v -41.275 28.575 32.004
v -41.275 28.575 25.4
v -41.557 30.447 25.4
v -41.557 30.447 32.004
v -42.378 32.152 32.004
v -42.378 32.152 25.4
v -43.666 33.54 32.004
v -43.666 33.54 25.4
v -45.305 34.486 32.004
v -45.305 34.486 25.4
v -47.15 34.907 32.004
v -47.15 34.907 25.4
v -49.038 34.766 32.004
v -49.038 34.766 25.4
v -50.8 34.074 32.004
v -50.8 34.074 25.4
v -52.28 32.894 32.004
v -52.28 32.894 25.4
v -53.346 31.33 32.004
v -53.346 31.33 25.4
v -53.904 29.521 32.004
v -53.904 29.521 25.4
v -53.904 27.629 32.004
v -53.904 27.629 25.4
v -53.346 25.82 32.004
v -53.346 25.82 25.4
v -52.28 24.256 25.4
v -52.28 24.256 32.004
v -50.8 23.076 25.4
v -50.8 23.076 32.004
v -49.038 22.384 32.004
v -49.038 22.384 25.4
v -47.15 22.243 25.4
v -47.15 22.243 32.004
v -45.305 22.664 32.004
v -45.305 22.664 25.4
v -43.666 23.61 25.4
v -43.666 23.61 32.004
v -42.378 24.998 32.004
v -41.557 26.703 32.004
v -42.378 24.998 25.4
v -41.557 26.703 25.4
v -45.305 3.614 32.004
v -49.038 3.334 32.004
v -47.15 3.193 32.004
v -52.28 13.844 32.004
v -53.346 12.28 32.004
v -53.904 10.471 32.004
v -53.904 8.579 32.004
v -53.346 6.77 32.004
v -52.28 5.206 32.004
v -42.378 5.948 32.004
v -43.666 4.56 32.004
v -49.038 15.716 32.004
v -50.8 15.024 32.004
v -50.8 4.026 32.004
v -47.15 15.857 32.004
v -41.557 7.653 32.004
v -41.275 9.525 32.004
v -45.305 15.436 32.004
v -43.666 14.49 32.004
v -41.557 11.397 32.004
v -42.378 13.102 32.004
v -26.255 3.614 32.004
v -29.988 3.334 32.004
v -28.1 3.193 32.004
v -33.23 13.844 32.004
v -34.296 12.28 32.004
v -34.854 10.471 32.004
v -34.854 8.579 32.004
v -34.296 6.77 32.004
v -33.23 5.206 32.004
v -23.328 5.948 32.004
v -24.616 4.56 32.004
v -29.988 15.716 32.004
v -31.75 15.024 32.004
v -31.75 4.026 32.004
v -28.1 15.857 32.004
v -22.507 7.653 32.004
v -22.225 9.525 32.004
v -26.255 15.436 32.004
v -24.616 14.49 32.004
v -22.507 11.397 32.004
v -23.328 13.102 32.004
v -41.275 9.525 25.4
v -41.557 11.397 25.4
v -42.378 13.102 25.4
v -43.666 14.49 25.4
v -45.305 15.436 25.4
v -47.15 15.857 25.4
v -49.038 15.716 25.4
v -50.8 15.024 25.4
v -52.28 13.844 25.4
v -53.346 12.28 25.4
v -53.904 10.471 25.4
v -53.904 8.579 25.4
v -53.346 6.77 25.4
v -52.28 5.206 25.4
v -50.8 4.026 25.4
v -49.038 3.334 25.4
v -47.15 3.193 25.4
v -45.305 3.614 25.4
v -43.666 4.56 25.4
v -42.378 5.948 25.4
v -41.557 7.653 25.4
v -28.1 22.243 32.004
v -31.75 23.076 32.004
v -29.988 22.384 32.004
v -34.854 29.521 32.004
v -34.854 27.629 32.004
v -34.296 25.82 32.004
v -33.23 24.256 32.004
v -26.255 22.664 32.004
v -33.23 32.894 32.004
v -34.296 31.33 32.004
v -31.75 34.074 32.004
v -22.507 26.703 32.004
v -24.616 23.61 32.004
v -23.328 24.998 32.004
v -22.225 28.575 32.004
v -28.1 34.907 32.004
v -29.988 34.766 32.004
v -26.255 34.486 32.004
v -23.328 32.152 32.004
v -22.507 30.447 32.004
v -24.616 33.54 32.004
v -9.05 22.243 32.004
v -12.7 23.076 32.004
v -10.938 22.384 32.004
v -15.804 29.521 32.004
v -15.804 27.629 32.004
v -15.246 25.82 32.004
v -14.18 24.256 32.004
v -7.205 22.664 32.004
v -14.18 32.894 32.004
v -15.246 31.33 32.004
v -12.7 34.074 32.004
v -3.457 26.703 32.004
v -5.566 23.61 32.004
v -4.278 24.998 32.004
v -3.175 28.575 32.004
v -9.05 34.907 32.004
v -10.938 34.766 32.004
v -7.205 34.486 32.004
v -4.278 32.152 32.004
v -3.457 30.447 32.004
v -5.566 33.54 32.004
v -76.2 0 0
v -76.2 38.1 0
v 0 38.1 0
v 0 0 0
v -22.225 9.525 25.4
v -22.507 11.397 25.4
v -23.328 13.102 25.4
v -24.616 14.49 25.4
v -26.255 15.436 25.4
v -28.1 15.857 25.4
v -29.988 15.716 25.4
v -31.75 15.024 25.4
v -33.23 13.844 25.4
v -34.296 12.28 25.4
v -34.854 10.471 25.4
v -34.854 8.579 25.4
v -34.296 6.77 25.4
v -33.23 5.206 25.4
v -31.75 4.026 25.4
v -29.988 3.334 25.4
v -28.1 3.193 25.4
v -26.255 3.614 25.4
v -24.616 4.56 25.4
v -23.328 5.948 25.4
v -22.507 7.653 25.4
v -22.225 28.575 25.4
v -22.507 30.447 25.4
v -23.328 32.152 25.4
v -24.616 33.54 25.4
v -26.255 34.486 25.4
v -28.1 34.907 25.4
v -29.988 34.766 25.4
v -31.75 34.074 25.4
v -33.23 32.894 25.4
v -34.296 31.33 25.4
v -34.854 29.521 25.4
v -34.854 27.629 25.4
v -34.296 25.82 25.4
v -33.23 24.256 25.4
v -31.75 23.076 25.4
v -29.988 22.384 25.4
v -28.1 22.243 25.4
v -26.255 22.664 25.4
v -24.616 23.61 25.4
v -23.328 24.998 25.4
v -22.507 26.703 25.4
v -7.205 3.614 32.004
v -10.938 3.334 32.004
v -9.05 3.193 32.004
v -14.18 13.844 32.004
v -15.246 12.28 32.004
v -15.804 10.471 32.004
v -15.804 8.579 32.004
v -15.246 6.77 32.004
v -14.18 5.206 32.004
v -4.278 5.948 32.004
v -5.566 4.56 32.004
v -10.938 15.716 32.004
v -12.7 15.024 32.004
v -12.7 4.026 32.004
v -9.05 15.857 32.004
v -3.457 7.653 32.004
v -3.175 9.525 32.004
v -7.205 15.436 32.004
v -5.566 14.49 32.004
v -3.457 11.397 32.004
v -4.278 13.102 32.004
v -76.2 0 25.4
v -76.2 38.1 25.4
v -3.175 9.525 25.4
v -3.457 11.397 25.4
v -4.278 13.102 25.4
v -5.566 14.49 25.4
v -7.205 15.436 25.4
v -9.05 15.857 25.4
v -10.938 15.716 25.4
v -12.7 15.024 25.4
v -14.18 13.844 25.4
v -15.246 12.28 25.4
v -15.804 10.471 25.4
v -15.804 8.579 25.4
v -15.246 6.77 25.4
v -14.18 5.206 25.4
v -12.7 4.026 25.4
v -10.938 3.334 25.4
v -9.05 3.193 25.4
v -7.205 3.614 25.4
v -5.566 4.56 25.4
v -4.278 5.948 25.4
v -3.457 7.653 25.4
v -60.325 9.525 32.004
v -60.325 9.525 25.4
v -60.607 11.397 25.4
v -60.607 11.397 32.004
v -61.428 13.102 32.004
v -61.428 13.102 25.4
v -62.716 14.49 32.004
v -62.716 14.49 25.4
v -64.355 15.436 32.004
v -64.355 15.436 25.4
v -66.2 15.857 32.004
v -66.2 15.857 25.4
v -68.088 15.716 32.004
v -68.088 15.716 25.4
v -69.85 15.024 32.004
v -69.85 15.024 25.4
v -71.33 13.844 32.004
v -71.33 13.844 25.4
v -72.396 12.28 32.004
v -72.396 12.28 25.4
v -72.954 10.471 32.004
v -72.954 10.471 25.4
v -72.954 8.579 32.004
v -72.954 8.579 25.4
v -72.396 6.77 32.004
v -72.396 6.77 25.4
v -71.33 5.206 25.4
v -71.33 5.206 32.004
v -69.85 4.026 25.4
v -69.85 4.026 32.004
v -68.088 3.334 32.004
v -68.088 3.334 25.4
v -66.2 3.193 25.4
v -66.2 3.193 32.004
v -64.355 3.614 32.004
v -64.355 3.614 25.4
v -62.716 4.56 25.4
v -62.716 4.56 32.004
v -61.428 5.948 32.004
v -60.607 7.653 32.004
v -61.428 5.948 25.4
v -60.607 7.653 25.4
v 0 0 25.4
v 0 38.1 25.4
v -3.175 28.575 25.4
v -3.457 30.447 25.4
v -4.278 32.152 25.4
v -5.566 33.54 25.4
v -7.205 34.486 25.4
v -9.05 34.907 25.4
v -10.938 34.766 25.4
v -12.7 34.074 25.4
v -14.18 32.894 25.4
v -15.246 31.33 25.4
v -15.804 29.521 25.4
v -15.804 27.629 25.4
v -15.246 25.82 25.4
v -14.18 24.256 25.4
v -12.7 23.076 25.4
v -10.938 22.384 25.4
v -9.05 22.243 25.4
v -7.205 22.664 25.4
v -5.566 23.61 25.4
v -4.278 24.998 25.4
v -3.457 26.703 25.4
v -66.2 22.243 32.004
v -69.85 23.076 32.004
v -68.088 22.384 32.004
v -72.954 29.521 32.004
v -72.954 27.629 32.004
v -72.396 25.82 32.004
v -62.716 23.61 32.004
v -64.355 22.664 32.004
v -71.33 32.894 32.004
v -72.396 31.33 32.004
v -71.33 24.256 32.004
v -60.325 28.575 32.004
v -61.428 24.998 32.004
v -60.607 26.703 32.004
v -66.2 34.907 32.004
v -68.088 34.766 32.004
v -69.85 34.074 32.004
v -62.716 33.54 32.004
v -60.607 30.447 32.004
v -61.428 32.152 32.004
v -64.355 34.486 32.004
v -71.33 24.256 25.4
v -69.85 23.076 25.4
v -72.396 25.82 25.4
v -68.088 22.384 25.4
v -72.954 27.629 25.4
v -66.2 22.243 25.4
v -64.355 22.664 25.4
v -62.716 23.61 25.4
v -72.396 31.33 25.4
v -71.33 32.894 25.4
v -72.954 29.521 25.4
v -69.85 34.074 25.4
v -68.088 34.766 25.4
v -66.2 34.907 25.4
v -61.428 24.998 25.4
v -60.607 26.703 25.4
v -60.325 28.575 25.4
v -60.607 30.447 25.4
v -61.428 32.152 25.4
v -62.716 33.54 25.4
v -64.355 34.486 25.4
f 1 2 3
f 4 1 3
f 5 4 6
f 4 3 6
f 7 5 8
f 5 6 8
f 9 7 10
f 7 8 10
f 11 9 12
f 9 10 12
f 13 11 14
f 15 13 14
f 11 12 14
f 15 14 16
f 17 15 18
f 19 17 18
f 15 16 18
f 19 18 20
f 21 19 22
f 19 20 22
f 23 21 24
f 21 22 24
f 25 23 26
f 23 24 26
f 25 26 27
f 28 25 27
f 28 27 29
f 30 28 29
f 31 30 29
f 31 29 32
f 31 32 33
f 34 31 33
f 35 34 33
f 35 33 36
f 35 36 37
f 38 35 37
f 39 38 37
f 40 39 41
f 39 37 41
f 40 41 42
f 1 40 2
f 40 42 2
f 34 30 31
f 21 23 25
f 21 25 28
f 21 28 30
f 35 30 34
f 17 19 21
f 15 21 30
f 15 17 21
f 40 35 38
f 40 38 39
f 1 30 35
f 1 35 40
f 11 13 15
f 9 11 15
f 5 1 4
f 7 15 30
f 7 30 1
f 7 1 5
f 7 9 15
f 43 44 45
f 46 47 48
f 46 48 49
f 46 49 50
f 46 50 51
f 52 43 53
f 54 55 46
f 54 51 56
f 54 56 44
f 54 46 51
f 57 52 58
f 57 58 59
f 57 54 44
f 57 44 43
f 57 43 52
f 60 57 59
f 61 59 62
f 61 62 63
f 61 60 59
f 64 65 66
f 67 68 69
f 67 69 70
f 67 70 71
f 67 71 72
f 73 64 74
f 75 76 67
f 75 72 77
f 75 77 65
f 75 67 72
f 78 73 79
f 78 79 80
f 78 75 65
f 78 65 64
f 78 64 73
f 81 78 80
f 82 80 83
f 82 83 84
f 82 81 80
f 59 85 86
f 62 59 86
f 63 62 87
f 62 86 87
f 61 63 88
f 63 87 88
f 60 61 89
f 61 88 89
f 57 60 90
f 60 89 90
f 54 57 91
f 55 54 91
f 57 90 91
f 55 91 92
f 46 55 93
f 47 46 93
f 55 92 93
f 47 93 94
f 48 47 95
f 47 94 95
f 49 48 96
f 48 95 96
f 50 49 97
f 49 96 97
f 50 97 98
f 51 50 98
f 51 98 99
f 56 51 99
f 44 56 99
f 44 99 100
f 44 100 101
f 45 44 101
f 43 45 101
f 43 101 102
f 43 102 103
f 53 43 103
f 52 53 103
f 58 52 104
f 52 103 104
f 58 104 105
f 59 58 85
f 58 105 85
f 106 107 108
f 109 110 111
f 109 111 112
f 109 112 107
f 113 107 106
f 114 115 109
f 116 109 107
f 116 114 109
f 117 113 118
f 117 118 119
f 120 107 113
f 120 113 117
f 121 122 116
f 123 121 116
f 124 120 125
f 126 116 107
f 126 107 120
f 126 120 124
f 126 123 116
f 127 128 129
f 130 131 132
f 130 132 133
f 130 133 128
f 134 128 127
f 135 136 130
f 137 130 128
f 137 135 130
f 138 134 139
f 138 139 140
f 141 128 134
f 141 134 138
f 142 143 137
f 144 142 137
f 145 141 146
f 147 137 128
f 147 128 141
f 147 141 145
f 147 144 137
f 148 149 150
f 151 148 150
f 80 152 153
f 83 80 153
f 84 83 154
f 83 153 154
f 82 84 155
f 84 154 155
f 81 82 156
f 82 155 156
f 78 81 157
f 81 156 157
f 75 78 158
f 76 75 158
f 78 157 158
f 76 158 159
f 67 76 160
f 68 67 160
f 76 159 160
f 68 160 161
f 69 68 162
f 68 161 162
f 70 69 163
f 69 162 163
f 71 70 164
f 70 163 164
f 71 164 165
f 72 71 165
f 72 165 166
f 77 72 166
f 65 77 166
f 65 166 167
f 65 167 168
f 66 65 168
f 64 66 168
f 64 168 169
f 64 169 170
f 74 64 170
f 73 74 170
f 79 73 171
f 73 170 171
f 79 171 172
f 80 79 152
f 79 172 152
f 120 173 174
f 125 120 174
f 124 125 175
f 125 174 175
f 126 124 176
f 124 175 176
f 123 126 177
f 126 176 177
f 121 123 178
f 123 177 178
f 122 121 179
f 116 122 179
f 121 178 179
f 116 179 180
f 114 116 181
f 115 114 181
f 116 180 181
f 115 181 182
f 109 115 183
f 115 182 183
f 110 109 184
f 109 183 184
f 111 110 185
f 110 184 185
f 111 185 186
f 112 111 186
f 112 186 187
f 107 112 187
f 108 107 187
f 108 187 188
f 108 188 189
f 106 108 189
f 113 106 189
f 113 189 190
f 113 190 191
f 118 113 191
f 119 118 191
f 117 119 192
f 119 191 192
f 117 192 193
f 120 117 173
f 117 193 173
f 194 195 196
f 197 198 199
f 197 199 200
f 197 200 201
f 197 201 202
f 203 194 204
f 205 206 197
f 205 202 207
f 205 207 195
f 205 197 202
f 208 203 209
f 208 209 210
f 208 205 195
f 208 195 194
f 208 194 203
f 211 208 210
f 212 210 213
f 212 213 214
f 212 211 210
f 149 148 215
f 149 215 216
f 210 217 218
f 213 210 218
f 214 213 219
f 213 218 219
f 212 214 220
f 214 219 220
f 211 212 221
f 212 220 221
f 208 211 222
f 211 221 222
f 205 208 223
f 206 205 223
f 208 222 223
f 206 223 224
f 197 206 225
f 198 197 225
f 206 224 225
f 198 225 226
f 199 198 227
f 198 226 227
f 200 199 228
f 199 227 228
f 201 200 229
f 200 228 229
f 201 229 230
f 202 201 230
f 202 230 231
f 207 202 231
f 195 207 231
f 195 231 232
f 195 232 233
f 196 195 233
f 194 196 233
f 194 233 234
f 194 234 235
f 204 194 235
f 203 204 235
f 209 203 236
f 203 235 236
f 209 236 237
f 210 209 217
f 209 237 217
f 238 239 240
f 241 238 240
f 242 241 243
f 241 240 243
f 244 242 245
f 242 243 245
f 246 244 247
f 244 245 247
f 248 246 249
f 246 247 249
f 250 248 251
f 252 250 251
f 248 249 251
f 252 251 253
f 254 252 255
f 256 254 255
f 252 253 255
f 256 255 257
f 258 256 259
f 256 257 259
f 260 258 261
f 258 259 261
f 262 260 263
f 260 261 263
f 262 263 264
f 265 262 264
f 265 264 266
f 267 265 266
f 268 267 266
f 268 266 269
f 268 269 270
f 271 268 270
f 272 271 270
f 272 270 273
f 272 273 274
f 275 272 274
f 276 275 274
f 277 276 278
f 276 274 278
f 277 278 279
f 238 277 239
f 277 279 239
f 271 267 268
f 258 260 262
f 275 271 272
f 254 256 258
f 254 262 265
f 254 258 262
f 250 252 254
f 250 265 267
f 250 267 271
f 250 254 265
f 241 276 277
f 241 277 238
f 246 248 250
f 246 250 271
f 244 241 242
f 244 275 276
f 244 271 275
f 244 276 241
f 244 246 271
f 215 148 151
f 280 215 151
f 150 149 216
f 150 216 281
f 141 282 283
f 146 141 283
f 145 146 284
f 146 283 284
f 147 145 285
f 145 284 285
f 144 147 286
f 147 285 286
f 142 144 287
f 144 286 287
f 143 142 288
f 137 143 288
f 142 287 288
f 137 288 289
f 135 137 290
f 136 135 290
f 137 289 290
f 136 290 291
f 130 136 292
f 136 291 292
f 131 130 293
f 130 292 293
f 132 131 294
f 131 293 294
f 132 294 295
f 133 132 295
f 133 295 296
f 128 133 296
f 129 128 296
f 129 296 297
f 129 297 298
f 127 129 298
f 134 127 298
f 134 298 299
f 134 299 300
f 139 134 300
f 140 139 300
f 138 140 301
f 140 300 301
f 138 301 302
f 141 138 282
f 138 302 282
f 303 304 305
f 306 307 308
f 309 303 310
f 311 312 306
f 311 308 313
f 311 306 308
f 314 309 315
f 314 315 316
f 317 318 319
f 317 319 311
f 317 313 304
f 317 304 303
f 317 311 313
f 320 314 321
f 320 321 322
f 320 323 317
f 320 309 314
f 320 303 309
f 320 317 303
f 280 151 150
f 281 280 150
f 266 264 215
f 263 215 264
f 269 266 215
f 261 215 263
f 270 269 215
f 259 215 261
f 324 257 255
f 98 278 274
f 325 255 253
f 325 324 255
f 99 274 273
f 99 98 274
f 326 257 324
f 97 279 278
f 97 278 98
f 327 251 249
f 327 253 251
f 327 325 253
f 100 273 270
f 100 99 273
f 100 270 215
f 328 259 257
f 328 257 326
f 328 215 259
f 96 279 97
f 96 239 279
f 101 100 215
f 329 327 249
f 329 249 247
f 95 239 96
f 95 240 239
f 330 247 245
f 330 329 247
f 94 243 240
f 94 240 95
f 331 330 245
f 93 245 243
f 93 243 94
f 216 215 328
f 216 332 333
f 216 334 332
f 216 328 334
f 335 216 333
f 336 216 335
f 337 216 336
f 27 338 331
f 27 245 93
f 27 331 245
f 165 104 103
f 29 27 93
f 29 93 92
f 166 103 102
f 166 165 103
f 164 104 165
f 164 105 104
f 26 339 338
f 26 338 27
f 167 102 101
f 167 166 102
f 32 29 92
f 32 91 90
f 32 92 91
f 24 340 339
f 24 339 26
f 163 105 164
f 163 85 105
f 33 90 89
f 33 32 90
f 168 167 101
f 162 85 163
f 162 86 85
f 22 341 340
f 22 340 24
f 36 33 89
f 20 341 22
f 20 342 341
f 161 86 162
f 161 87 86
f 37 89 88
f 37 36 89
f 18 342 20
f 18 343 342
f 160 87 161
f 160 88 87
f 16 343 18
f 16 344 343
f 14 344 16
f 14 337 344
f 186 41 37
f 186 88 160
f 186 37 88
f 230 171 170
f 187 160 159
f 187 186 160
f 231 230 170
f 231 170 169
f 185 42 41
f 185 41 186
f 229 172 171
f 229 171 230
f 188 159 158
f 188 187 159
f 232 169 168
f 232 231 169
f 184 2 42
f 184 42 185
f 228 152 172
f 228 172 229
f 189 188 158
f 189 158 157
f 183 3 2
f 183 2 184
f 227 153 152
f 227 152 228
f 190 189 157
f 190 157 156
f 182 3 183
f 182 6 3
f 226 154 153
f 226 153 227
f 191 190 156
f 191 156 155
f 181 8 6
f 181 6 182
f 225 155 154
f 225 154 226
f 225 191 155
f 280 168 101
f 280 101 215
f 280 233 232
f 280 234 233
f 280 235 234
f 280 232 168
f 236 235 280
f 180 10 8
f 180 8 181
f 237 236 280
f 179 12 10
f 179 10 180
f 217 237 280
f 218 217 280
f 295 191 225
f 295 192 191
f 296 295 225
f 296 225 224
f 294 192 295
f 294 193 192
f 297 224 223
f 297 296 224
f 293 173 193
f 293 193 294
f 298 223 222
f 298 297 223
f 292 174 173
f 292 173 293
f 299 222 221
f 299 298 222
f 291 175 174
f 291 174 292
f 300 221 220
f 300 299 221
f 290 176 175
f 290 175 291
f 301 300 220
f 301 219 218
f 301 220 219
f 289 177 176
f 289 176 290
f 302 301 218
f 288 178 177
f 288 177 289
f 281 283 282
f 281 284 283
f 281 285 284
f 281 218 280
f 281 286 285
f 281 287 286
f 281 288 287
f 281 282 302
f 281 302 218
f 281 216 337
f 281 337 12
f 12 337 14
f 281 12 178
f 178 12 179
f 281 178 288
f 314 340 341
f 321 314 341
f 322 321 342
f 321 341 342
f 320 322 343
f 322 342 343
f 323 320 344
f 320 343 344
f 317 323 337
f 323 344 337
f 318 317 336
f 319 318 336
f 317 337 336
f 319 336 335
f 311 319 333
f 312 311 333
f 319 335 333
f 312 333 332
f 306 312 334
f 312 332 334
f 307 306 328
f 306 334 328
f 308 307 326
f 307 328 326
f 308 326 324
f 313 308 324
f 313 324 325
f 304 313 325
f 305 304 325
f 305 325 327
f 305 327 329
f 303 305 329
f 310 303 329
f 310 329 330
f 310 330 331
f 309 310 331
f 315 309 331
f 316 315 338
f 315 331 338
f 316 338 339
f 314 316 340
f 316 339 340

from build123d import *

# Parameters (mm, degrees)
F0_W     = 76.2
F0_H     = 38.1
F1_DEPTH = 25.4
F2_R     = 6.35
F3_DEPTH = 6.604


with BuildPart() as f1:
    # F0 (on Top) → F1 (new body)
    with BuildSketch(Plane.XY):
        with Locations((-38.1, 19.05)):
            Rectangle(F0_W, F0_H)
    extrude(amount=F1_DEPTH)

    # F2 (on face) → F3 (join)
    with BuildSketch(Plane.XY.offset(25.4)):
        with Locations((-66.675, 28.575)):
            Circle(F2_R)
        with Locations((-47.625, 28.575)):
            Circle(F2_R)
        with Locations((-28.575, 28.575)):
            Circle(F2_R)
        with Locations((-9.525, 28.575)):
            Circle(F2_R)
        with Locations((-9.525, 9.525)):
            Circle(F2_R)
        with Locations((-28.575, 9.525)):
            Circle(F2_R)
        with Locations((-47.625, 9.525)):
            Circle(F2_R)
        with Locations((-66.675, 9.525)):
            Circle(F2_R)
    extrude(amount=F3_DEPTH)


solid = f1.part
